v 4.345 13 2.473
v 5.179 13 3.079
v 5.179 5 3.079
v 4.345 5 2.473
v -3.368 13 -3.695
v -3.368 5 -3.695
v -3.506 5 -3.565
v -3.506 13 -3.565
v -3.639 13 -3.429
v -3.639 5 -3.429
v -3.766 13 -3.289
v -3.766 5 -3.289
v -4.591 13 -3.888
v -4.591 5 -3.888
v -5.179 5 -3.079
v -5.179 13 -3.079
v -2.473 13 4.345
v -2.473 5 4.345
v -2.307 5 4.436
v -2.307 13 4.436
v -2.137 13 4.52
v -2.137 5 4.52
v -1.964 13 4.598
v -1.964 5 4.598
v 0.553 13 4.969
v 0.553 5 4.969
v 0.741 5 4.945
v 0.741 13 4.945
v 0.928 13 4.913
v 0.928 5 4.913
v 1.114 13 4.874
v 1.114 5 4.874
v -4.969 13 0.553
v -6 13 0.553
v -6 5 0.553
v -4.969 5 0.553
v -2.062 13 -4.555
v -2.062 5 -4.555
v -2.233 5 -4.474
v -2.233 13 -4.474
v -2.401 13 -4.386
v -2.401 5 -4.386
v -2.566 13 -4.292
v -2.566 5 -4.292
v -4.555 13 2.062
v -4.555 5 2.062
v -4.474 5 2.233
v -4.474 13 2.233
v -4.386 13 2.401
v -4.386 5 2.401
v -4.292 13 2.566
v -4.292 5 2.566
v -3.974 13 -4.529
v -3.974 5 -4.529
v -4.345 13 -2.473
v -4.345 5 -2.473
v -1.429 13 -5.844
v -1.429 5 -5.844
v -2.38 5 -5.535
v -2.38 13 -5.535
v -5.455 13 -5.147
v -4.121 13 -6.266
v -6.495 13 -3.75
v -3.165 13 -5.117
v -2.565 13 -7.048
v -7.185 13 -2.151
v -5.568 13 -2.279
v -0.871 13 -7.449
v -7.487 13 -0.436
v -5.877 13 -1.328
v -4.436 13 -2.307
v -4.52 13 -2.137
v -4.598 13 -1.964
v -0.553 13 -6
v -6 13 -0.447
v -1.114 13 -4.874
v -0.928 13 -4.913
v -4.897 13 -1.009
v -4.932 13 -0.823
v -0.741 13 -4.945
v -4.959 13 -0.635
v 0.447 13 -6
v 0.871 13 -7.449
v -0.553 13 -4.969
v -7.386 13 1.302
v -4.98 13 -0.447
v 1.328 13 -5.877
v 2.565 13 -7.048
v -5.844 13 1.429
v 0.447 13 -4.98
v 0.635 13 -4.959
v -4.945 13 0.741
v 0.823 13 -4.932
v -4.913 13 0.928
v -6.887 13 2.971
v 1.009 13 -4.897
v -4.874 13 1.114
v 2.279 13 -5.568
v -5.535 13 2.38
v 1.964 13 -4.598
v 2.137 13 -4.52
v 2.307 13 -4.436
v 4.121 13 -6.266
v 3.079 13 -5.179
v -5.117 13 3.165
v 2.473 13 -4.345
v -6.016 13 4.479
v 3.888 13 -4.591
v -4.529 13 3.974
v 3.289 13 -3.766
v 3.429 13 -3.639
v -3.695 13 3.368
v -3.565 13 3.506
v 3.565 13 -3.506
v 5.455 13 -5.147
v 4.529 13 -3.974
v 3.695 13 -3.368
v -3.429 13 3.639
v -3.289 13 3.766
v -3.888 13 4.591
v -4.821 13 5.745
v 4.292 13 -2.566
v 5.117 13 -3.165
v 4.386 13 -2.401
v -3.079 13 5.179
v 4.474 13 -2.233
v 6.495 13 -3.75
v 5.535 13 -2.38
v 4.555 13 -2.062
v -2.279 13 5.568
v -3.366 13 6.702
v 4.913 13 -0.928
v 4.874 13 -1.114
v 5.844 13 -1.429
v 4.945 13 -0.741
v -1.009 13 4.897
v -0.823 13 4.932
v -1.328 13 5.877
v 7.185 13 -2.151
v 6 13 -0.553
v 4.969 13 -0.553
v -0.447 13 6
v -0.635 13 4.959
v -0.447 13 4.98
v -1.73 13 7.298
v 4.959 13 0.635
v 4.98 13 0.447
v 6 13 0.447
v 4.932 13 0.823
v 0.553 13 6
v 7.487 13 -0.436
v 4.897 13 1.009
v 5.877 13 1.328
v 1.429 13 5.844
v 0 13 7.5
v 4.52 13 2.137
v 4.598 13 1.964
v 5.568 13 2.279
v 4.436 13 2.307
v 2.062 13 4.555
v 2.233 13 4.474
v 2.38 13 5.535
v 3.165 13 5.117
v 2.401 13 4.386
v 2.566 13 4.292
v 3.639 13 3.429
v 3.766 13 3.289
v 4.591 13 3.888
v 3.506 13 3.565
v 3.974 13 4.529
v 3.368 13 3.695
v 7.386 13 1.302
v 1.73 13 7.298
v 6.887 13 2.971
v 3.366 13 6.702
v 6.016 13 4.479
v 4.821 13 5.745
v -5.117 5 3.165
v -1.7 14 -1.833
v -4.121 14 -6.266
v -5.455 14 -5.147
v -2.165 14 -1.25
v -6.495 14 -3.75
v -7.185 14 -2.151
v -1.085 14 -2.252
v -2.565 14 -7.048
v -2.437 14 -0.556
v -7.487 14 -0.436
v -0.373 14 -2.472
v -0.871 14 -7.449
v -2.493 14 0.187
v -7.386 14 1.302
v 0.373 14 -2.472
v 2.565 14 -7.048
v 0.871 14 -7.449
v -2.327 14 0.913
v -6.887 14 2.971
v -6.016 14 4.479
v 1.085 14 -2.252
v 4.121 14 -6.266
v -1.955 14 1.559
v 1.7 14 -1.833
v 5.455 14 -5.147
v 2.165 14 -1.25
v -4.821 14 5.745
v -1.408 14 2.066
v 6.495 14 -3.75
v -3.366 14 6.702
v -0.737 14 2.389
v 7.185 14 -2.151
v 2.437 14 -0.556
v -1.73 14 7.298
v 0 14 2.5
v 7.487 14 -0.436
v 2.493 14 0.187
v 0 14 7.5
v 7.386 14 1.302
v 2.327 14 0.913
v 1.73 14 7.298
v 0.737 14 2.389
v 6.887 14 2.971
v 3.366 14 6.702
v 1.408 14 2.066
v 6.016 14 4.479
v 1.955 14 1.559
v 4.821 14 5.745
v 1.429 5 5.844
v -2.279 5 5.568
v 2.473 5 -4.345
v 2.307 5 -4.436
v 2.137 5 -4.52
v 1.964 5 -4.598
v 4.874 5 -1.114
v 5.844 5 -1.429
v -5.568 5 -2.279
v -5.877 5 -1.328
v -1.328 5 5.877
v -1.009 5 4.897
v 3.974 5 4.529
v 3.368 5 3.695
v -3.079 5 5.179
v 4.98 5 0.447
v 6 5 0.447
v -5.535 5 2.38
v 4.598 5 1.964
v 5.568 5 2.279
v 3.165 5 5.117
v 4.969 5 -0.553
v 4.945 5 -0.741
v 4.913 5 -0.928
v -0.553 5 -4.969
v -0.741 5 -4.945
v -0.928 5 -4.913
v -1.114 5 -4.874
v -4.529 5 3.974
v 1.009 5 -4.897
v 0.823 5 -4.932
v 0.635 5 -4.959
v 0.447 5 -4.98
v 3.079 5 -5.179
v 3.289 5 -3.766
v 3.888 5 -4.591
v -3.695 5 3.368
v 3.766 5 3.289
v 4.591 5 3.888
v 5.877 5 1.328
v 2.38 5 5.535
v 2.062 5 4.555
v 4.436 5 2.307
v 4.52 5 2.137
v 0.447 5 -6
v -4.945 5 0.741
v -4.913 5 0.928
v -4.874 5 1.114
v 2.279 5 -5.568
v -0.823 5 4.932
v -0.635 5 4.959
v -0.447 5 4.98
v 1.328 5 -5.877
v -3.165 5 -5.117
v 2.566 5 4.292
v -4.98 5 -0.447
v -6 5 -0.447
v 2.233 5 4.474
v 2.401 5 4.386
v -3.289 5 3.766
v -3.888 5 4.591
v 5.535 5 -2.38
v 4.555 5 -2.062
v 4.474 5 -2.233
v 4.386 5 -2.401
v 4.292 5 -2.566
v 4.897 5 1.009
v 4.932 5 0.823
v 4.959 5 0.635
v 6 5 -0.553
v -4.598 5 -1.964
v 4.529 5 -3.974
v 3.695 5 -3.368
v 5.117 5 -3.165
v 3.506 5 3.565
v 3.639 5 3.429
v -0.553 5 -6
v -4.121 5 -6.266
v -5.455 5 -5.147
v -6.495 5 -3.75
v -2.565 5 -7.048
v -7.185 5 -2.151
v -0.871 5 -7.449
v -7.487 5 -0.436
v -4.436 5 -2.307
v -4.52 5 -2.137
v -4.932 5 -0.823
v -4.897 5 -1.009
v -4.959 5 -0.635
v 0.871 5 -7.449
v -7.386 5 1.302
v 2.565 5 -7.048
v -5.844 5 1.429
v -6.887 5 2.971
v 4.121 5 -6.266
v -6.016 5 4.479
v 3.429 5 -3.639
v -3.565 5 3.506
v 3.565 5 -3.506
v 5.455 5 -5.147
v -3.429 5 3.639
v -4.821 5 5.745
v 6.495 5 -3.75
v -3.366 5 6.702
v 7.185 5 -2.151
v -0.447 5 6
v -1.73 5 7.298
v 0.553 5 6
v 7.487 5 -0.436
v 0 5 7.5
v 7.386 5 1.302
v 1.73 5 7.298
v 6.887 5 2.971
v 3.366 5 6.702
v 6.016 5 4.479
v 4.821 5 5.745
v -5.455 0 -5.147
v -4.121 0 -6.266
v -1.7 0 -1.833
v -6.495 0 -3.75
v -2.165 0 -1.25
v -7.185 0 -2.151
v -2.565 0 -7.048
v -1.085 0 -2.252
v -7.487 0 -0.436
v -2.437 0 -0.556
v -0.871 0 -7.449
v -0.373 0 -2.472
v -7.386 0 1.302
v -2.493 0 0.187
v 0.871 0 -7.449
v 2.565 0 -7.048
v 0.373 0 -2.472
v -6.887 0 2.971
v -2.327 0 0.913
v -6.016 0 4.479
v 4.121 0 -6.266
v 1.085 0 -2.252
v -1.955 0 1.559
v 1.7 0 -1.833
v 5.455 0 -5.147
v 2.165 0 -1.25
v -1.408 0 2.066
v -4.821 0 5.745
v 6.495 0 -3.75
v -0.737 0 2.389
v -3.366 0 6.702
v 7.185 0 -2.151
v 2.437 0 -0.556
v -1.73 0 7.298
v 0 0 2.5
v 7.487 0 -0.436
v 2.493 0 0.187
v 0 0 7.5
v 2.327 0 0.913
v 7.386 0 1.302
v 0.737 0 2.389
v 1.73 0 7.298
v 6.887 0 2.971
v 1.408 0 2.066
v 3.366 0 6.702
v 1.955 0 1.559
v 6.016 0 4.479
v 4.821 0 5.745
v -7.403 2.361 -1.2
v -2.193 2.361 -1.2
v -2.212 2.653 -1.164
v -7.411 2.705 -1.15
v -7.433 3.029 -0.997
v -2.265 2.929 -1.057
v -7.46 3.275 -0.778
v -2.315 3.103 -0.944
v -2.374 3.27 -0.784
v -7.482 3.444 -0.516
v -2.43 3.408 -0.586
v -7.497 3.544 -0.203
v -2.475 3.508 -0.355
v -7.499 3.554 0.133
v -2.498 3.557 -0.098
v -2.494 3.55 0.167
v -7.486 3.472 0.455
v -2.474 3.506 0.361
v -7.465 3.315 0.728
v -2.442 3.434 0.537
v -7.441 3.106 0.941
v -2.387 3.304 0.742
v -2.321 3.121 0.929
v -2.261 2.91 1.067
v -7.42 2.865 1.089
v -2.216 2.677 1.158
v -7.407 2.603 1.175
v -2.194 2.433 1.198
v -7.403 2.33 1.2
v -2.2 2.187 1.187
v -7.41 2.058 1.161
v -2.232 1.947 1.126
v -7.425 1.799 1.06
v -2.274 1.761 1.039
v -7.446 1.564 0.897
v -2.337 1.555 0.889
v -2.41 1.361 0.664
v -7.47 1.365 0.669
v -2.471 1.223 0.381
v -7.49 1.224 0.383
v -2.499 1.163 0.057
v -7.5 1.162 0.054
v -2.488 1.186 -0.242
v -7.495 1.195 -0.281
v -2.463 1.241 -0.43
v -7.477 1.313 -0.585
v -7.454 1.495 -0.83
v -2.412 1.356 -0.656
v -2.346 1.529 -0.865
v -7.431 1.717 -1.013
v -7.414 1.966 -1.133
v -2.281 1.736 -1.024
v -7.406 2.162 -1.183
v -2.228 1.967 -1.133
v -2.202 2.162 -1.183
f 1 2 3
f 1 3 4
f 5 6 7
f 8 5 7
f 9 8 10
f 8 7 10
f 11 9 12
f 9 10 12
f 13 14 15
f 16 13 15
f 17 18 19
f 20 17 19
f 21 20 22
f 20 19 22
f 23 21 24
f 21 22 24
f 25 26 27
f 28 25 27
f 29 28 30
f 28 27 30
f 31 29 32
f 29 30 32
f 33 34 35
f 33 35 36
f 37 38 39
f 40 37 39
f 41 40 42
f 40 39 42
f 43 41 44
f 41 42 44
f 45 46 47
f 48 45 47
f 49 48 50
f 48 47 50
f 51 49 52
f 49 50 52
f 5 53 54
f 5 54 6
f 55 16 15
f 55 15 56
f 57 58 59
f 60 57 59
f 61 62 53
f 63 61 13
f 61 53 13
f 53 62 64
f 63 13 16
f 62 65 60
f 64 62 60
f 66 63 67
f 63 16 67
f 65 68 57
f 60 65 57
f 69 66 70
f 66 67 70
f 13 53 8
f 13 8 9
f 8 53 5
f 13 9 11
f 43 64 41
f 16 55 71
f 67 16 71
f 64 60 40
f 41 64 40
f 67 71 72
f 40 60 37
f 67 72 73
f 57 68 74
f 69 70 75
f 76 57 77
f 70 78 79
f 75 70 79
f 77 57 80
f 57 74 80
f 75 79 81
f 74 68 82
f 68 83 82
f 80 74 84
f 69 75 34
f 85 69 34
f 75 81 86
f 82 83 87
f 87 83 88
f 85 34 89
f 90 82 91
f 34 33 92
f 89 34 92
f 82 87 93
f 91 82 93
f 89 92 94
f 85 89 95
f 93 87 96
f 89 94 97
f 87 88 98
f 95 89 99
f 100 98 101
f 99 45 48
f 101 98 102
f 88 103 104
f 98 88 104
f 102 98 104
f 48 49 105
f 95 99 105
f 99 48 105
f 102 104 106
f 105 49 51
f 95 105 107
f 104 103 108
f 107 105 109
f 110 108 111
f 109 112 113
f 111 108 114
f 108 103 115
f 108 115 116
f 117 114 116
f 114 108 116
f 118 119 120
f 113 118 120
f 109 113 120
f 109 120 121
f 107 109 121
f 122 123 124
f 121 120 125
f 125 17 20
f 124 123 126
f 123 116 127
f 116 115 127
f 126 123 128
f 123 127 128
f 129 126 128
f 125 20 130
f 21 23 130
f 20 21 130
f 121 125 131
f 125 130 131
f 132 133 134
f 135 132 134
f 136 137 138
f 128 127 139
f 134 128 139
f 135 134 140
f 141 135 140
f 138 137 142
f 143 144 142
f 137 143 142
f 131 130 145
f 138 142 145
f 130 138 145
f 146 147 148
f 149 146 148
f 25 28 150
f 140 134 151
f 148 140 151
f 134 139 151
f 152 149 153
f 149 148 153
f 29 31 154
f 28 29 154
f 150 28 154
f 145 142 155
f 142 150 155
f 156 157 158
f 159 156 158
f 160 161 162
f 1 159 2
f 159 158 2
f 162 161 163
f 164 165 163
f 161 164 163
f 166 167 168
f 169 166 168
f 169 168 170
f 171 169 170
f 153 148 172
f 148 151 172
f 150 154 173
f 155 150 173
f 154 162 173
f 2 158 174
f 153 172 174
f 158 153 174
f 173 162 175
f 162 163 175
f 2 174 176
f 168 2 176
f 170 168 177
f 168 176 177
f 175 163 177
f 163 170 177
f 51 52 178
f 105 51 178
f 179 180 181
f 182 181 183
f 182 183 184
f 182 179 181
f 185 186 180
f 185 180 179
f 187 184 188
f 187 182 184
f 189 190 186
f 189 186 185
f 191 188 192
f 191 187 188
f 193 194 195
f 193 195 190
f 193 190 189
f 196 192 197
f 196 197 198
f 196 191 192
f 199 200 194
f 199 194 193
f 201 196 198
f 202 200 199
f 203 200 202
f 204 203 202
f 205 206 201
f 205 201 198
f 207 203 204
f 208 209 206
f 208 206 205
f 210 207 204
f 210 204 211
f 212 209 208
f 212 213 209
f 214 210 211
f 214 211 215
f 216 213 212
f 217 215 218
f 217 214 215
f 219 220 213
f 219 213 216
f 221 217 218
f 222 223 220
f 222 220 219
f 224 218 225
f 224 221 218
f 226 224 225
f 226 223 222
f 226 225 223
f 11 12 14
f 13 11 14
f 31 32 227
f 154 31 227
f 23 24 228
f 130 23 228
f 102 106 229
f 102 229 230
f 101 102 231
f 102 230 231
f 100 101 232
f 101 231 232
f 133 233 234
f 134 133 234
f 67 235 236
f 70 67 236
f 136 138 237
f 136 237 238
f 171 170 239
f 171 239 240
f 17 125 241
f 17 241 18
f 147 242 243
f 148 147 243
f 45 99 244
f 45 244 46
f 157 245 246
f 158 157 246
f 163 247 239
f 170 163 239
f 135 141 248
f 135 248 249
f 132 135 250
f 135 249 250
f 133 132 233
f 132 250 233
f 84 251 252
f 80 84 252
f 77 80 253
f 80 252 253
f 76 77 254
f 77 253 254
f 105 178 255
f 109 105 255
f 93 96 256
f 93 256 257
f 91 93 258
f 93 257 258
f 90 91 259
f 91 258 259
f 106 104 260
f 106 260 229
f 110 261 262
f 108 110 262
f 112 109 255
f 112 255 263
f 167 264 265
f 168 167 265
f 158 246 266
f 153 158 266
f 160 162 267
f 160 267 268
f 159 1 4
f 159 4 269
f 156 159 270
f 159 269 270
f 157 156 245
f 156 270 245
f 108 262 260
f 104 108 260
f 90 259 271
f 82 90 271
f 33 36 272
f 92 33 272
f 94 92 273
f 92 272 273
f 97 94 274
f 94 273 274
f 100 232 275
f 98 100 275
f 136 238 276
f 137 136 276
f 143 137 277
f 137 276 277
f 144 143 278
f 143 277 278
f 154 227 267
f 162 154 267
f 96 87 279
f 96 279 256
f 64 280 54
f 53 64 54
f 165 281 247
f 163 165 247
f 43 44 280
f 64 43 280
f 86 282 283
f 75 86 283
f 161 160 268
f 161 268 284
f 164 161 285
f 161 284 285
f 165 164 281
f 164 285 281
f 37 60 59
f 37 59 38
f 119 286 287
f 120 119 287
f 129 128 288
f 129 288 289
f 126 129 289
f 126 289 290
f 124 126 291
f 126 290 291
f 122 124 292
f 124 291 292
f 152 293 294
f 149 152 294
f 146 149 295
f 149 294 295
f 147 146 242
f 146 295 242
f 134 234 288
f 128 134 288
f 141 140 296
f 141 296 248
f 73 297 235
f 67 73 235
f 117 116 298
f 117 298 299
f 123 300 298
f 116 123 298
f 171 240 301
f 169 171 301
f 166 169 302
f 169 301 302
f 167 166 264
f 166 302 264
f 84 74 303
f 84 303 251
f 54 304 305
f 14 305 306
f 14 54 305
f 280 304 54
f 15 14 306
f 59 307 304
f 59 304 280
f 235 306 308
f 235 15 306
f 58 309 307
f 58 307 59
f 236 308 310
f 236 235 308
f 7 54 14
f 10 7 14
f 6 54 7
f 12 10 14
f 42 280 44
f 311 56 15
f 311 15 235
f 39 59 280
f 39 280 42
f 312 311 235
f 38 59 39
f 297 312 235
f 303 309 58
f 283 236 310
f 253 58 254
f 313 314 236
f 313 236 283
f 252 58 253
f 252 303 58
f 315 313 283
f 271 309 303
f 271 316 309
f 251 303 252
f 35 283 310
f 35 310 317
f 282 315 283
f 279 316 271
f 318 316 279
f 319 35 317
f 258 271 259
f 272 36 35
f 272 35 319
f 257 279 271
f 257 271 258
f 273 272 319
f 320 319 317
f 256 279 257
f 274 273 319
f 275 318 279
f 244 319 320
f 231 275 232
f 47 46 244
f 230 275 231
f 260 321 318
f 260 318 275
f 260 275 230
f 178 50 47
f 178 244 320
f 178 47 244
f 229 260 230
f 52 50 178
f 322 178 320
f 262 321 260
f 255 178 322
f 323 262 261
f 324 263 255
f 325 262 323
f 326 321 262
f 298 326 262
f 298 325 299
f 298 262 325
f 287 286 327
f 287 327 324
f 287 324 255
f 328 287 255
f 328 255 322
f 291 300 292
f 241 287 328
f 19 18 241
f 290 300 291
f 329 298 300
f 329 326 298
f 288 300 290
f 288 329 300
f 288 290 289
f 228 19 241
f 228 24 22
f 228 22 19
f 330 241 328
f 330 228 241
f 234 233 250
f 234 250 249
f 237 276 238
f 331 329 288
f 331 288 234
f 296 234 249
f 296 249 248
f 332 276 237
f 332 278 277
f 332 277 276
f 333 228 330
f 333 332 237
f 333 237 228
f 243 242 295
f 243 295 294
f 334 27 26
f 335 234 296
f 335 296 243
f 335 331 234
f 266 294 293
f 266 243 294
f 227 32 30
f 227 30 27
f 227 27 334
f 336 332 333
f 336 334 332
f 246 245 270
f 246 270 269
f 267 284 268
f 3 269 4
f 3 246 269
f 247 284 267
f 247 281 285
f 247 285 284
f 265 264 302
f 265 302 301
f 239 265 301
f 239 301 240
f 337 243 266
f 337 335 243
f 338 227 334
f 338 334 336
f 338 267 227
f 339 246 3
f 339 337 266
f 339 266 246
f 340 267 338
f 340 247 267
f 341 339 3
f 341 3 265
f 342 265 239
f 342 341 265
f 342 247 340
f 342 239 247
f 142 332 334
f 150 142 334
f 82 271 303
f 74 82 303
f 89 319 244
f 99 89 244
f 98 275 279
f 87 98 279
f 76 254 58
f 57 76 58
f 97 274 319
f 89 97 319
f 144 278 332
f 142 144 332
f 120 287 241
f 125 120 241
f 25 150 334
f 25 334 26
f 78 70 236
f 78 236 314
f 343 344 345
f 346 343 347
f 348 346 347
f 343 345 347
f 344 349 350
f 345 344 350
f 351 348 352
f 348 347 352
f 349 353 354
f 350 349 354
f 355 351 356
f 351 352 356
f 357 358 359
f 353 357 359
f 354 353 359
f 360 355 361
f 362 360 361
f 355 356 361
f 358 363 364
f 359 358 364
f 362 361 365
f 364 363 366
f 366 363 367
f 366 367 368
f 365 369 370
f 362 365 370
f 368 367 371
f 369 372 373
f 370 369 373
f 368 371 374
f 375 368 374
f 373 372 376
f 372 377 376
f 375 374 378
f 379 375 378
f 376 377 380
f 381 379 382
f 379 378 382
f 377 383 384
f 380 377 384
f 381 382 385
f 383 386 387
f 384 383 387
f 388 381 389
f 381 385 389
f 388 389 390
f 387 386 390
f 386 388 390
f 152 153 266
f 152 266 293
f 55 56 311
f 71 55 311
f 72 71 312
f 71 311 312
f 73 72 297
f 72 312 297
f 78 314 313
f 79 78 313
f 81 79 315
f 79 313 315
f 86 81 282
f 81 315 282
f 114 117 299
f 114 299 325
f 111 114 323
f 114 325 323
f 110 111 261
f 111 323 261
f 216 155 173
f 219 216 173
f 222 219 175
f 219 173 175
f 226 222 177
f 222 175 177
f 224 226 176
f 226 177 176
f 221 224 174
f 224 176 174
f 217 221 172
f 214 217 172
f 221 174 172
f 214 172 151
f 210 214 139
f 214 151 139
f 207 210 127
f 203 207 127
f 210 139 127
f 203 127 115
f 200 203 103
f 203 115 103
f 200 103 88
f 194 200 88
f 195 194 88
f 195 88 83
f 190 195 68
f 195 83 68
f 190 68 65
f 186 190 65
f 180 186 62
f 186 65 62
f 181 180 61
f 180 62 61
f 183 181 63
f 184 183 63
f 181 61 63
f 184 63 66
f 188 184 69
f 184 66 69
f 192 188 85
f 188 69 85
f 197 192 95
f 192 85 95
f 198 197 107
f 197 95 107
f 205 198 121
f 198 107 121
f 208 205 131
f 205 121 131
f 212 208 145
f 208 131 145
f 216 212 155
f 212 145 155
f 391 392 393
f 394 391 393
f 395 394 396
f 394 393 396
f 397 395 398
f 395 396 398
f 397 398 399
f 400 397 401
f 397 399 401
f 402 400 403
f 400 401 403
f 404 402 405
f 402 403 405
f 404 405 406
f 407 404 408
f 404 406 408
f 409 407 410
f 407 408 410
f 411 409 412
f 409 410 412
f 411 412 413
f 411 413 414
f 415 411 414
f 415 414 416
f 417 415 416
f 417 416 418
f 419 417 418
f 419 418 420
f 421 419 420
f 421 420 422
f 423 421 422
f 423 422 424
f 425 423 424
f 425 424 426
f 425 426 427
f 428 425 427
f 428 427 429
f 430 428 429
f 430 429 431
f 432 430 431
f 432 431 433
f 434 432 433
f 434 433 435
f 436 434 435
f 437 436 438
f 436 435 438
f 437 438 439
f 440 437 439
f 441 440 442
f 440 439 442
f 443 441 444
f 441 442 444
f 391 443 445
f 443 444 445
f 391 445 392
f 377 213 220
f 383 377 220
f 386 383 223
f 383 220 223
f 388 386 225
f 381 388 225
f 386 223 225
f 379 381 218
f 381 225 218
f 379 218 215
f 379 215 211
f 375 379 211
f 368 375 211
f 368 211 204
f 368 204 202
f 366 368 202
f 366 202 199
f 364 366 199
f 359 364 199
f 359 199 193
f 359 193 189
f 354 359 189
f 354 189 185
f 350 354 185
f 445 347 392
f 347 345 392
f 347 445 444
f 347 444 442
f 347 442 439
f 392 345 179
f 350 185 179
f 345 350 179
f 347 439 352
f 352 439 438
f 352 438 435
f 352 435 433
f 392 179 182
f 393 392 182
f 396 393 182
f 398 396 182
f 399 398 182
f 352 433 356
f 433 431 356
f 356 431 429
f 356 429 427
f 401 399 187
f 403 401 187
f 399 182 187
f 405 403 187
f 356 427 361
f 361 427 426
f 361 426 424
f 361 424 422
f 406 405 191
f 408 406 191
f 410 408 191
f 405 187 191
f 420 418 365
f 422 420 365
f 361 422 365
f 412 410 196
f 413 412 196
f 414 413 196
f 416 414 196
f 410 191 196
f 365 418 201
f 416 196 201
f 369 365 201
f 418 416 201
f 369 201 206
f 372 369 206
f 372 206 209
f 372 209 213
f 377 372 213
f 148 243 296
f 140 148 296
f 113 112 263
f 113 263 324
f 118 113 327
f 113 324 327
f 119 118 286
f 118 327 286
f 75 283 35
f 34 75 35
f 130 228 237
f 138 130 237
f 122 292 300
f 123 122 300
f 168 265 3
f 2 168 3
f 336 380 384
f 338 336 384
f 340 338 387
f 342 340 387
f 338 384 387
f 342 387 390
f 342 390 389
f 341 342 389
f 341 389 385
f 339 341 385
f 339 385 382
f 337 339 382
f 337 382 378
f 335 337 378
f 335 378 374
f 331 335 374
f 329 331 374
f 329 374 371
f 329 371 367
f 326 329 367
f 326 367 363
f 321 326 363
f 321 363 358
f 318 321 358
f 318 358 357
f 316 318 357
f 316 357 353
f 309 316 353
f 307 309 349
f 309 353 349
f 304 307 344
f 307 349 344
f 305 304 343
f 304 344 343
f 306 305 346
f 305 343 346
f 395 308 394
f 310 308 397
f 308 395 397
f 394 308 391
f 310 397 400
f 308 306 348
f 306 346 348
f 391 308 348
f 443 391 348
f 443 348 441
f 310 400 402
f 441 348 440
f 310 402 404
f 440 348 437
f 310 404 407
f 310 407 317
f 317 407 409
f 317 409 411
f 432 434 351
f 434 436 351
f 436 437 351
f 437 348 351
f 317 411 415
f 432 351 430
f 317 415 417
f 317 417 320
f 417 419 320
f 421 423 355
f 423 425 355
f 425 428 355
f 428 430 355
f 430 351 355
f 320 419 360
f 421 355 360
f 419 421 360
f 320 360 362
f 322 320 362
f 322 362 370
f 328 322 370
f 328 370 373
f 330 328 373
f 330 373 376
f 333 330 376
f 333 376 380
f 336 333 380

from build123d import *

# Parameters (mm, degrees)
IZIM1_R                     = 7.5
Y_KSEKLIK_EKSTR_ZYON1_DEPTH = 5
IZIM6_R                     = 5
Y_KSEKLIK_EKSTR_ZYON5_DEPTH = 8
Y_KSEKLIK_EKSTR_ZYON6_START = -8
Y_KSEKLIK_EKSTR_ZYON6_DEPTH = 8
DAIRESEL_KAPLAMA2_COUNT     = 20
IZIM8_R                     = 7.5
Y_KSEKLIK_EKSTR_ZYON7_DEPTH = 1
IZIM9_R                     = 2.5
KES_EKSTR_ZYON2_DEPTH       = 21
IZIM10_R                    = 1.2
KES_EKSTR_ZYON3_DEPTH       = 21


with BuildPart() as part:
    # Çizim1 → Yükseklik-Ekstrüzyon1 (new body)
    with BuildSketch(Plane(origin=(0, 0, 0), x_dir=(1, 0, 0), z_dir=(0, 1, 0))):
        with Locations(Location((0, 0, 0), (0, 0, 270))):
            Circle(IZIM1_R)
    extrude(amount=Y_KSEKLIK_EKSTR_ZYON1_DEPTH)

    # Çizim6 → Yükseklik-Ekstrüzyon5 (add)
    with BuildSketch(Plane(origin=(0, 5, 0), x_dir=(1, 0, 0), z_dir=(0, 1, 0))):
        with Locations(Location((0, 0, 0), (0, 0, 270))):
            Circle(IZIM6_R)
    extrude(amount=Y_KSEKLIK_EKSTR_ZYON5_DEPTH)

    # Çizim7 → Yükseklik-Ekstrüzyon6 (add)
    with BuildSketch(Plane(origin=(0, 13, 0), x_dir=(1, 0, 0), z_dir=(0, 1, 0)).offset(Y_KSEKLIK_EKSTR_ZYON6_START)):
        with BuildLine():
            Line((0, 6), (0, 5))
            ThreePointArc((0, 5), (0.223628846, 4.99499651), (0.446810123, 4.979996056))
            Line((0.446810123, 4.979996056), (0.446810123, 6))
            Line((0.446810123, 6), (0, 6))
        make_face()
        with BuildLine():
            ThreePointArc((-0.553189877, 4.969303871), (-0.277020438, 4.99232007), (0, 5))
            Line((0, 5), (0, 6))
            Line((0, 6), (-0.553189877, 6))
            Line((-0.553189877, 6), (-0.553189877, 4.969303871))
        make_face()
    y_kseklik_ekstr_zyon6 = extrude(amount=Y_KSEKLIK_EKSTR_ZYON6_DEPTH)

    # Dairesel Kaplama2: Yükseklik-Ekstrüzyon6 ×20 about axis
    dairesel_kaplama2_axis = Axis((0, 0, 0), (0, 1, 0))
    for i in range(1, DAIRESEL_KAPLAMA2_COUNT):
        add(y_kseklik_ekstr_zyon6.rotate(dairesel_kaplama2_axis, i * 360 / DAIRESEL_KAPLAMA2_COUNT))

    # Çizim8 → Yükseklik-Ekstrüzyon7 (add)
    with BuildSketch(Plane(origin=(0, 13, 0), x_dir=(1, 0, 0), z_dir=(0, 1, 0))):
        with Locations(Location((0, 0, 0), (0, 0, 270))):
            Circle(IZIM8_R)
    extrude(amount=Y_KSEKLIK_EKSTR_ZYON7_DEPTH)

    # Çizim9 → Kes-Ekstrüzyon2 (cut)
    with BuildSketch(Plane(origin=(0, 14, 0), x_dir=(1, 0, 0), z_dir=(0, 1, 0))):
        with Locations(Location((0, 0, 0), (0, 0, 270))):
            Circle(IZIM9_R)
    extrude(amount=-KES_EKSTR_ZYON2_DEPTH, mode=Mode.SUBTRACT)

    # Çizim10 → Kes-Ekstrüzyon3 (cut)
    with BuildSketch(Plane(origin=(0, 0, 0), x_dir=(0, 0, -1), z_dir=(1, 0, 0))):
        with Locations((0, 2.361227205)):
            Circle(IZIM10_R)
    extrude(amount=-KES_EKSTR_ZYON3_DEPTH, mode=Mode.SUBTRACT)


solid = part.part
